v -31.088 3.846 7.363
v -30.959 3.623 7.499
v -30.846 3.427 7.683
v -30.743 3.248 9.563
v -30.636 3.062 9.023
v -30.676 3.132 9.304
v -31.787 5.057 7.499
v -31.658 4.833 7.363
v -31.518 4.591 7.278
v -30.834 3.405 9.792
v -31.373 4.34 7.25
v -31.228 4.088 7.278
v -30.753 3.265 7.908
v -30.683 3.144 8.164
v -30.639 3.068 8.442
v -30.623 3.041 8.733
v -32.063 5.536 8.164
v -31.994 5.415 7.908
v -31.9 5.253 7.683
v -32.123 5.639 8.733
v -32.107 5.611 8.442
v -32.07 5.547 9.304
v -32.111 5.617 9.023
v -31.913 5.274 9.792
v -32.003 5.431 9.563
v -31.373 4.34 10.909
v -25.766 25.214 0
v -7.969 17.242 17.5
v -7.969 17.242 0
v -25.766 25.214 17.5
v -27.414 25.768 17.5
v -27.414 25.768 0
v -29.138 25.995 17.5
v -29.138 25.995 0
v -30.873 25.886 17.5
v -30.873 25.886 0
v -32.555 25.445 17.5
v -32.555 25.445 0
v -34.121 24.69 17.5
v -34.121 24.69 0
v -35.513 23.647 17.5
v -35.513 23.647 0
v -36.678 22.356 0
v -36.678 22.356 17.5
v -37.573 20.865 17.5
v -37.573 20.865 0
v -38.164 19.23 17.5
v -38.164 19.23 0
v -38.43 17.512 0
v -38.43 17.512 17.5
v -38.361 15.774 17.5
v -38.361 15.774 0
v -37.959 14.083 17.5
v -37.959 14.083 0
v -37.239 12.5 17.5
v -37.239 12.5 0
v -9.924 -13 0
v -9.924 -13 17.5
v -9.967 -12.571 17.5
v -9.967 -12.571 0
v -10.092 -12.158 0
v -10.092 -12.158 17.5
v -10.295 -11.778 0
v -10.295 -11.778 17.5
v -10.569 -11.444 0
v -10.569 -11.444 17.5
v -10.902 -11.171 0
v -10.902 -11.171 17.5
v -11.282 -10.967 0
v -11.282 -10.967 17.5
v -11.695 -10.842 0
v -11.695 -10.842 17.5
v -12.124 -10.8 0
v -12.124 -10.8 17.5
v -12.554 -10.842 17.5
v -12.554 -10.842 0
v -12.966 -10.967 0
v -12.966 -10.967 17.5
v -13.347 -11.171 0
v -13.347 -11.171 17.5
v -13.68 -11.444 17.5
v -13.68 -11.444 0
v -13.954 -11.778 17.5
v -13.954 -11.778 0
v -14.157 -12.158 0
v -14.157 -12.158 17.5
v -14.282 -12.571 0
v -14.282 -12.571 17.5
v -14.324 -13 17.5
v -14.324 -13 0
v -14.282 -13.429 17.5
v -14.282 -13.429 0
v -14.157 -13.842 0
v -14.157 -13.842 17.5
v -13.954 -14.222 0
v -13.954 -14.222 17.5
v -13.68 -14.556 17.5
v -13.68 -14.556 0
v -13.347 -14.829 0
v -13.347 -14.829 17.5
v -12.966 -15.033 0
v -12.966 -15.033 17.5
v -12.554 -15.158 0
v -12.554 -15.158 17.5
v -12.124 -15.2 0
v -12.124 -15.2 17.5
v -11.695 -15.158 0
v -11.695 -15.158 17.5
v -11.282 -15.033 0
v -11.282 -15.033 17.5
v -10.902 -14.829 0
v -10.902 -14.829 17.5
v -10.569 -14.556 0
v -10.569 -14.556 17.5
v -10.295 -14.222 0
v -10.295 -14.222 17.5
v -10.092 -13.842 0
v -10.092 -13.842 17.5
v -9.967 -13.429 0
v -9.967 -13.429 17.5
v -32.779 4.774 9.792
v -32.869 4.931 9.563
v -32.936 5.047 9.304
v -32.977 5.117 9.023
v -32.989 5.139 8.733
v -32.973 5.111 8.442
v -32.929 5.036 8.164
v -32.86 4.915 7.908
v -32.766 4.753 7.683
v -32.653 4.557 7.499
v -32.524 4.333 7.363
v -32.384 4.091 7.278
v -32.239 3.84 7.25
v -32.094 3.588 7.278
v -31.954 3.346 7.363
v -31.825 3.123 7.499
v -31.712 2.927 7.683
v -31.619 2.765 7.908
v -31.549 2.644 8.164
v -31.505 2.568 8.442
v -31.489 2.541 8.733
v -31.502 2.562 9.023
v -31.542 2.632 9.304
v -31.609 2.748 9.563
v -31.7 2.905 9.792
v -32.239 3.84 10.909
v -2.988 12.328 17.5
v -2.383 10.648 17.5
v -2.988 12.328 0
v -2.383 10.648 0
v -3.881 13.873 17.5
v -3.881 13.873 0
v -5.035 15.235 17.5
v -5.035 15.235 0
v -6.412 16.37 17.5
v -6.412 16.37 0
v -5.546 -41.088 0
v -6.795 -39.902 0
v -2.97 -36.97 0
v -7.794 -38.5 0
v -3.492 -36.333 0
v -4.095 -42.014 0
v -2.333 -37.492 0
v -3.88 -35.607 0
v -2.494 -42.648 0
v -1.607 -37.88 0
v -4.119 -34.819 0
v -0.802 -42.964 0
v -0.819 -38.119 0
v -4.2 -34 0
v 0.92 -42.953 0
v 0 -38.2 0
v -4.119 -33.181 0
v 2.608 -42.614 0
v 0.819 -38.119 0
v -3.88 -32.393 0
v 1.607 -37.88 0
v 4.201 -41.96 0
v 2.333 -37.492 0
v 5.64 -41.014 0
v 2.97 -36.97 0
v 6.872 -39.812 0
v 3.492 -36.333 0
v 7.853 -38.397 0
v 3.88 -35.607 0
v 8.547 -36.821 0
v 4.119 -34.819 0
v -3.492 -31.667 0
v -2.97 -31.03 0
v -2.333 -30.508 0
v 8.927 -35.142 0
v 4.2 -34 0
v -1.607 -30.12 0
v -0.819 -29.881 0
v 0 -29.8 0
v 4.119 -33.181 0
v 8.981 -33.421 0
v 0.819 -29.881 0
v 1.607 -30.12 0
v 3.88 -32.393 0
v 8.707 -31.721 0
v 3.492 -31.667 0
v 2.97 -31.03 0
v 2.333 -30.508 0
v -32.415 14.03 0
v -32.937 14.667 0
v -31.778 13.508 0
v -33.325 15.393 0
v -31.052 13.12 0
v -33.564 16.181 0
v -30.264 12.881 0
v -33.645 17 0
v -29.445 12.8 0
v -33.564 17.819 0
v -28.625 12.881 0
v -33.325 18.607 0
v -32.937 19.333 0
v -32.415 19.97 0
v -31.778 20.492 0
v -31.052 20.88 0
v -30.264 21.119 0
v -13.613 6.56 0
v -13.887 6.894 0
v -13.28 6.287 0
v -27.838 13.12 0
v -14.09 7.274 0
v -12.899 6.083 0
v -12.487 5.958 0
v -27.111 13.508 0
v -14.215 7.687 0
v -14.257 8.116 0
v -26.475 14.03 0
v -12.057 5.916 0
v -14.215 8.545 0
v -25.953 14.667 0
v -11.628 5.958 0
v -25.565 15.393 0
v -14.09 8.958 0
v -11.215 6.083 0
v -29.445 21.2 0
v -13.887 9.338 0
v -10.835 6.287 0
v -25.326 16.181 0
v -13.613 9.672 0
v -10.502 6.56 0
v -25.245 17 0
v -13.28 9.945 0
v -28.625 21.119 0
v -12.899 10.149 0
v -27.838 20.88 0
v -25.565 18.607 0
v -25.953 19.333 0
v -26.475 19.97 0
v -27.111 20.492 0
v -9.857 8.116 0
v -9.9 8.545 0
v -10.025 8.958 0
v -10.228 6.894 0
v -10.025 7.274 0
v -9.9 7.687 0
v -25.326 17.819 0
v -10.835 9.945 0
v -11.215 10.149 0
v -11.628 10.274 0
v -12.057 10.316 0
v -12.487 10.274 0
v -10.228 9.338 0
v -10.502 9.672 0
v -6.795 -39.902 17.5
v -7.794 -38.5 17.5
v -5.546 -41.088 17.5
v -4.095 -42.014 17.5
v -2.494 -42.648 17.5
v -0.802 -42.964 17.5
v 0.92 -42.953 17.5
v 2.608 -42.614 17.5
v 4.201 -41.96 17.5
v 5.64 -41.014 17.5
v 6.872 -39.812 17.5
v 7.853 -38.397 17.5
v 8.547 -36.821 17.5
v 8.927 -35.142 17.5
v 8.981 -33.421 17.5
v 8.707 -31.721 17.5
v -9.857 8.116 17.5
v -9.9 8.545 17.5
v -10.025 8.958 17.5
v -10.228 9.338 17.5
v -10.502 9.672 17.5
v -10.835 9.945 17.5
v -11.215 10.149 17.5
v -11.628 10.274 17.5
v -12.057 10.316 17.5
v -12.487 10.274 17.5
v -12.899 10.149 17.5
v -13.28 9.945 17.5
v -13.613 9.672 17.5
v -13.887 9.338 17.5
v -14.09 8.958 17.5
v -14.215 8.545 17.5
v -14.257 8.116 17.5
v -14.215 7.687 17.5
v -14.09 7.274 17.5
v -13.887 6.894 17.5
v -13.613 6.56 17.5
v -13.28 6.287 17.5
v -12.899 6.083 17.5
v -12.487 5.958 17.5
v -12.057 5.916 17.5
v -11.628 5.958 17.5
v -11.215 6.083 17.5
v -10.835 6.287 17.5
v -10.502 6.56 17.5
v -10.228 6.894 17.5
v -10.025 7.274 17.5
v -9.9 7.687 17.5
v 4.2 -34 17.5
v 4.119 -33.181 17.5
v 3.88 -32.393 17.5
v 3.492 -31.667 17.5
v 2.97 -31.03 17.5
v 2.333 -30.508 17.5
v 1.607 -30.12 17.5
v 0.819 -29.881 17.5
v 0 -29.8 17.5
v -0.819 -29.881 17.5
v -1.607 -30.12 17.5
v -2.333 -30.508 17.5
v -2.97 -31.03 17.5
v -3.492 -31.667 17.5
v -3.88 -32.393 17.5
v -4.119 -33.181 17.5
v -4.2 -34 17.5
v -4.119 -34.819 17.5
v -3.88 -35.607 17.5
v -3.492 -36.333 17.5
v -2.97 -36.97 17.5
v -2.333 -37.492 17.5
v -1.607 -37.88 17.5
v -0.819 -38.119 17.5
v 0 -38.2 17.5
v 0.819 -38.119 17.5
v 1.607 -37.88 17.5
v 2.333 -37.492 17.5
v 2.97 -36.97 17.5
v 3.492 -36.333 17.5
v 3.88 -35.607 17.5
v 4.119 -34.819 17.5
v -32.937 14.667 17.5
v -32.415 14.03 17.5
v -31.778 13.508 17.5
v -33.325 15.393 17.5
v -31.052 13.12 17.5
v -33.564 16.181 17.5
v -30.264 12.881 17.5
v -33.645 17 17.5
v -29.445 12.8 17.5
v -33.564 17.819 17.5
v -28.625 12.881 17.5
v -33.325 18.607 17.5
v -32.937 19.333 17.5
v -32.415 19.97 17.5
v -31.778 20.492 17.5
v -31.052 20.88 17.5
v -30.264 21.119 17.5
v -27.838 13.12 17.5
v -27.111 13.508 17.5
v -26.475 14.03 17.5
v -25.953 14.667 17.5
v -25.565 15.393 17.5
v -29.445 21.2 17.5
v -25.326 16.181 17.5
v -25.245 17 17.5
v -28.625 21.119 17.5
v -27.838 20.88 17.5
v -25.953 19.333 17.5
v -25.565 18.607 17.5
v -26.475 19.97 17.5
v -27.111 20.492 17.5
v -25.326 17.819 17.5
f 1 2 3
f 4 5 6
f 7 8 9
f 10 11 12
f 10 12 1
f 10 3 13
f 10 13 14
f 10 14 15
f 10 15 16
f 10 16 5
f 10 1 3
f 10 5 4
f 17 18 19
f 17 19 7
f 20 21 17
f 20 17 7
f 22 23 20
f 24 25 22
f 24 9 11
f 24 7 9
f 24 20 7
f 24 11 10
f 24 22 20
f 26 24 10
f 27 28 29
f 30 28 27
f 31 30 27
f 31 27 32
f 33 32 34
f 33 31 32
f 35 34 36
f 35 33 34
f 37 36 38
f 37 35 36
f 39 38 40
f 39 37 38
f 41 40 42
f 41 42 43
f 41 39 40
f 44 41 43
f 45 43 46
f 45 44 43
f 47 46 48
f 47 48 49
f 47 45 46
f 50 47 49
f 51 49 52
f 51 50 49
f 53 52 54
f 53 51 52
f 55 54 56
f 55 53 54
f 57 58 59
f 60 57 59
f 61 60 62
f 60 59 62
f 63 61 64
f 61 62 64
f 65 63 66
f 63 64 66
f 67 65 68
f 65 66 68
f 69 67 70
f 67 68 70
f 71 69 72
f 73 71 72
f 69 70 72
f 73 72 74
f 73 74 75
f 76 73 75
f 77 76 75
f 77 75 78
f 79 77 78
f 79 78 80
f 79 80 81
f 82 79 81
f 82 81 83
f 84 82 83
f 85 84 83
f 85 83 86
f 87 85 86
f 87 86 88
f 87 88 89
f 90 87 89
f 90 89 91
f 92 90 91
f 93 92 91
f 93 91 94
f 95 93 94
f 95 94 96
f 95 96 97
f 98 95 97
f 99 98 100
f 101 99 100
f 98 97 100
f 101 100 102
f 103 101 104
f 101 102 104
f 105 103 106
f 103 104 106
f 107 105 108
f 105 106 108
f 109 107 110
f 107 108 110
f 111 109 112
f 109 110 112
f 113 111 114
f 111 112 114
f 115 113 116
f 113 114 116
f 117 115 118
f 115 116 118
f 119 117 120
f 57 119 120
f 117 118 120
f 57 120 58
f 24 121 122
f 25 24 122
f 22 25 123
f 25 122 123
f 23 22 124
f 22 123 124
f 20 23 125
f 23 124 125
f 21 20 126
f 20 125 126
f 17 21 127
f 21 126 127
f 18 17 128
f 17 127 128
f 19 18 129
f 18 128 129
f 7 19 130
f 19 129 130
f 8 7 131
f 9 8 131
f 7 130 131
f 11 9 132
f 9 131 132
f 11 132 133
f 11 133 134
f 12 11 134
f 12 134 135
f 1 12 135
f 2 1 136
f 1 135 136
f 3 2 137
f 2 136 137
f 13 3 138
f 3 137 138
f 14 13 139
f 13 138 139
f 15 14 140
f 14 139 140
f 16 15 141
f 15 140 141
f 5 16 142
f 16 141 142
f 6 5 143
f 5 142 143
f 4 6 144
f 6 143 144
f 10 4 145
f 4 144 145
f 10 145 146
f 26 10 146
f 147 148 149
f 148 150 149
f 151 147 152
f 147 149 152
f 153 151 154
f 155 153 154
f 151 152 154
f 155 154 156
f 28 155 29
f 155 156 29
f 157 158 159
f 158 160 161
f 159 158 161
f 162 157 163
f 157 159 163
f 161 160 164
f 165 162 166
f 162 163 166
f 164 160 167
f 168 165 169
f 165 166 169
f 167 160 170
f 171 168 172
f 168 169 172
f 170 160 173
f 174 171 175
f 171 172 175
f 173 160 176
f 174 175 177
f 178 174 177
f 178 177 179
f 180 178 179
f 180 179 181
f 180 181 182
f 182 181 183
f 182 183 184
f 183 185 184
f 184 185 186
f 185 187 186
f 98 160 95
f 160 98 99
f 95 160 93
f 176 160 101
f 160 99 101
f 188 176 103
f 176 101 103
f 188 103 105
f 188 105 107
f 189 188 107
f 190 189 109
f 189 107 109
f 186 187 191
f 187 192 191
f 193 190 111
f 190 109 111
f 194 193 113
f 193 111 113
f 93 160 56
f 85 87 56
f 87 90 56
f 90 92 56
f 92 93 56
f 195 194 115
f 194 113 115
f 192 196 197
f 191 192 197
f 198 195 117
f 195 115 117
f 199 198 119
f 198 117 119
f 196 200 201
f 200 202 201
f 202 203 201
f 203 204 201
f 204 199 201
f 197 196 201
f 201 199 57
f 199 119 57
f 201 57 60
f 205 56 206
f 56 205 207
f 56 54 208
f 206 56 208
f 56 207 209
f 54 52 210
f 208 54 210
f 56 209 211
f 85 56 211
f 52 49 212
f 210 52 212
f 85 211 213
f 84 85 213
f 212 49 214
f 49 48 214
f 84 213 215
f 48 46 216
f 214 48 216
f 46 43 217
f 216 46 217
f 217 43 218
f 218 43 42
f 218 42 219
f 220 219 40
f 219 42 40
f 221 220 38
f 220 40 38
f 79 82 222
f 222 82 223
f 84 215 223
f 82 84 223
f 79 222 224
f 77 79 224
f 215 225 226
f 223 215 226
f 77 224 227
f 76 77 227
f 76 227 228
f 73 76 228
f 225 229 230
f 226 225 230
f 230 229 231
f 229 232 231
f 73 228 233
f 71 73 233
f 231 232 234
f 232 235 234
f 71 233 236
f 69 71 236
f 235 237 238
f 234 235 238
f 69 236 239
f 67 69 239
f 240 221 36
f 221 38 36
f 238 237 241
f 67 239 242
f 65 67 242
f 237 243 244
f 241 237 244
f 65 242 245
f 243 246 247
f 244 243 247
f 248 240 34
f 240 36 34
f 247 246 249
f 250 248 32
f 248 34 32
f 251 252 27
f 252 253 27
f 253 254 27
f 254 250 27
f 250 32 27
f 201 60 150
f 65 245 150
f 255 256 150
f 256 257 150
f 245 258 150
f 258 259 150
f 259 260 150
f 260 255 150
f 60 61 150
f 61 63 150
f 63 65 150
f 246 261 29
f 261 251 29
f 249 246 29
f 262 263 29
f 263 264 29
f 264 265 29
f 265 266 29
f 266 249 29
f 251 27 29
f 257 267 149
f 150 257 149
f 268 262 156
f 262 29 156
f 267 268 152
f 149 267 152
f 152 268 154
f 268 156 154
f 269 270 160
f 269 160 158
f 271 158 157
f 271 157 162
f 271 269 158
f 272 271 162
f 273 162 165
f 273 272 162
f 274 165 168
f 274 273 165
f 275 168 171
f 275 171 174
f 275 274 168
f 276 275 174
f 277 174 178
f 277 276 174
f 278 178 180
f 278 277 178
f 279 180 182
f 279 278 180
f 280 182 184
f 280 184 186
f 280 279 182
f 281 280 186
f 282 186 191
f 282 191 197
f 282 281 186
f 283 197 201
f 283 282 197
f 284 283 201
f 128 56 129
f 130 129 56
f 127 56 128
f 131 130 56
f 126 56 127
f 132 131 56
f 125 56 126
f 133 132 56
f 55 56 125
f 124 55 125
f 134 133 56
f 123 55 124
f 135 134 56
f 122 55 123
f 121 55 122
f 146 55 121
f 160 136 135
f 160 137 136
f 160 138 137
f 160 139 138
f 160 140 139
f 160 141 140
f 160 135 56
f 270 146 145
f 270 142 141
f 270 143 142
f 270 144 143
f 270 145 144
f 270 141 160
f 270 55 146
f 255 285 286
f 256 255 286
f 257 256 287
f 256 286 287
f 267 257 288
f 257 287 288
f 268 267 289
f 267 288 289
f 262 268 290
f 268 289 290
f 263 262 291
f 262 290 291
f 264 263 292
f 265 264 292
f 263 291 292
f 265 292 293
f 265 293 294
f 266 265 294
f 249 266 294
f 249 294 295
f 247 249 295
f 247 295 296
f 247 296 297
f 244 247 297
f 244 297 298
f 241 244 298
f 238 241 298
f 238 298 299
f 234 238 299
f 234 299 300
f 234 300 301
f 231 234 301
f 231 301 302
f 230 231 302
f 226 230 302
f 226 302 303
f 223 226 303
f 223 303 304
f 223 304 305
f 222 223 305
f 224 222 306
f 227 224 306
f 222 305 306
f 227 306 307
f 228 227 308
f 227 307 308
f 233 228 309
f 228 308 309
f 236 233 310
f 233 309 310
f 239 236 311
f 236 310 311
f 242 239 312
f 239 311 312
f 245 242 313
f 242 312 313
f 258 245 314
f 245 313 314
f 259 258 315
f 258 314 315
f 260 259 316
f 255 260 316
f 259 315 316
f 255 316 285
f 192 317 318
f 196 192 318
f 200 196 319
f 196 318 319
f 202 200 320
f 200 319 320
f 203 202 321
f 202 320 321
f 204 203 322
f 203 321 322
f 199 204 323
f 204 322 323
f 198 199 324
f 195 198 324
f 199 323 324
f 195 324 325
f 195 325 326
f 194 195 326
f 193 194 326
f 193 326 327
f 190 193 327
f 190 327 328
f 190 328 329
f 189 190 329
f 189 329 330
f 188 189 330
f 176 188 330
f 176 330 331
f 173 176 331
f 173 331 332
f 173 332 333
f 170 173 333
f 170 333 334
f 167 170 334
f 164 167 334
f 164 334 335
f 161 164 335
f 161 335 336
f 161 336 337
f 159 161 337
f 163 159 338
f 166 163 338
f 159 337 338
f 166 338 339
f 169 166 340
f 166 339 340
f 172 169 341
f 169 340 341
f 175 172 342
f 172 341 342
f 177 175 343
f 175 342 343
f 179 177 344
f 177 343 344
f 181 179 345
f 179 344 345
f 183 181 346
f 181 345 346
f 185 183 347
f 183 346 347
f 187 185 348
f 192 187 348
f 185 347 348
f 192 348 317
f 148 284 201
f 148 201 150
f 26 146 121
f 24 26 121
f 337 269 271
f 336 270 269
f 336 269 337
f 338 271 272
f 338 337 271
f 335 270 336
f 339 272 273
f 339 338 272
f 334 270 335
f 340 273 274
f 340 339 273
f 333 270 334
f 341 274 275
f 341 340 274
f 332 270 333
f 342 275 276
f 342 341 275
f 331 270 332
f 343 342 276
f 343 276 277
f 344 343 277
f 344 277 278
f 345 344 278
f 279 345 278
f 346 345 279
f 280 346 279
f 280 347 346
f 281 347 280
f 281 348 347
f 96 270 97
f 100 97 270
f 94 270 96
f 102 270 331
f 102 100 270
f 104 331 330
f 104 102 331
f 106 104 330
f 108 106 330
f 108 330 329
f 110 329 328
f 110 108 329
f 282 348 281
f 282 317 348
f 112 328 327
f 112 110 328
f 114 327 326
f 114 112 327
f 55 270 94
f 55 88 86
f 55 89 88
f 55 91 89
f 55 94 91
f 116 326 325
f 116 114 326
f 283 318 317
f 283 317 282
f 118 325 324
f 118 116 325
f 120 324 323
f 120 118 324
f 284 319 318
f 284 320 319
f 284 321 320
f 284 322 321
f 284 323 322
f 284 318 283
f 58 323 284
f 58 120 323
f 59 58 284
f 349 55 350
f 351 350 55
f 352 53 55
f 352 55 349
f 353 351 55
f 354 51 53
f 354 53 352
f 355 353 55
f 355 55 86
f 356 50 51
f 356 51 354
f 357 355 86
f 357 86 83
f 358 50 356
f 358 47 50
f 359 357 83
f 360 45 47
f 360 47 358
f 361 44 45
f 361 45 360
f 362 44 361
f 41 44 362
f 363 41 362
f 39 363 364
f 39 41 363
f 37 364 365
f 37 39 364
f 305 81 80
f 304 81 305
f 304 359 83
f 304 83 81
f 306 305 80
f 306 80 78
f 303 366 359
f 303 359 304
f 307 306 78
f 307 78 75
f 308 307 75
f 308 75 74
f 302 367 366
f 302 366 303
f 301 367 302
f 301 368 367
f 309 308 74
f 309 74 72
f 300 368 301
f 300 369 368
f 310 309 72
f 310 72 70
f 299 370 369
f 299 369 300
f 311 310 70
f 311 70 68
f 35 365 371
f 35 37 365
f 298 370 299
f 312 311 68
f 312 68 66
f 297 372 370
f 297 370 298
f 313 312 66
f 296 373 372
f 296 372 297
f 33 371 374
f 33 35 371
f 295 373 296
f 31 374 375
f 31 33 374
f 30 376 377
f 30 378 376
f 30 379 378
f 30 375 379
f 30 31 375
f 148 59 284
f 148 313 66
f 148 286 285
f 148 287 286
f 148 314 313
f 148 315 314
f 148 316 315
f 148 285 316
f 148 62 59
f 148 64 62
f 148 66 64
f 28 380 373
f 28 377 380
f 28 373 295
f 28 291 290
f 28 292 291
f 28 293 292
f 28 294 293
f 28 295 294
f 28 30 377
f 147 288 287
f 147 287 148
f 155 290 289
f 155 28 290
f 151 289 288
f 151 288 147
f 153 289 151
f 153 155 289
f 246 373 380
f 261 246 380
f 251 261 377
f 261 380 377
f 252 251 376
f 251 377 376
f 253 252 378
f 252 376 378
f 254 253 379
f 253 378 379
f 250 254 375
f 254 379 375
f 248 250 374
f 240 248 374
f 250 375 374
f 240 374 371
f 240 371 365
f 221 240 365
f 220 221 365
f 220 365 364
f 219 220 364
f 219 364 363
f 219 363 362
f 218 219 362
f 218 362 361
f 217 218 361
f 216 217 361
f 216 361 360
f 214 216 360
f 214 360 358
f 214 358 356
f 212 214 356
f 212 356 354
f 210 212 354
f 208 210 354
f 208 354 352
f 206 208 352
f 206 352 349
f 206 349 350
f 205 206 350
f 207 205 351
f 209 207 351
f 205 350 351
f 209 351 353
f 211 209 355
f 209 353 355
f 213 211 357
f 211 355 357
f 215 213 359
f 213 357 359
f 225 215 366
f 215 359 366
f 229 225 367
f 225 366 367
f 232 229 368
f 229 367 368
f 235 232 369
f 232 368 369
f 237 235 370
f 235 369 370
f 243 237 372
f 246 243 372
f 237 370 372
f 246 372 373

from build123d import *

# Parameters (mm, degrees)
BOSS_EXTRUDE1_DEPTH = 17.5
CUT_EXTRUDE1_DEPTH  = 1
HOLE1_D             = 4.4
HOLE2_D             = 4.4
HOLE3_D             = 8.4
HOLE4_D             = 8.4
FILLET1_R           = 10


with BuildPart() as part:
    # Sketch1 → Boss-Extrude1 (new body)
    with BuildSketch(Plane.XY.offset(17.5)):
        with BuildLine():
            Line((8.706689755, -31.721063073), (-3.596567561, 15.283592096))
            Line((-3.596567561, 15.283592096), (-25.765781543, 25.213668746))
            ThreePointArc((-25.765781543, 25.213668746), (-36.126401787, 23.029680686), (-37.239092363, 12.5))
            Line((-37.239092363, 12.5), (-7.794228634, -38.5))
            ThreePointArc((-7.794228634, -38.5), (3.420035495, -42.324863795), (8.706689755, -31.721063073))
        make_face()
    extrude(amount=-BOSS_EXTRUDE1_DEPTH)

    # Sketch2 → Cut-Extrude1 (cut)
    with BuildSketch(Plane(origin=(-22.516660498, -13, 0), x_dir=(0, 0, 1), z_dir=(-0.866025403784438, -0.500000000000001, 0))):
        with BuildLine():
            Line((9.791987556, 18.365854028), (10.909334809, 19.444863729))
            Line((10.909334809, 19.444863729), (9.791987556, 20.523873429))
            ThreePointArc((9.791987556, 20.523873429), (7.25, 19.444863729), (9.791987556, 18.365854028))
        make_face()
    extrude(amount=-CUT_EXTRUDE1_DEPTH, mode=Mode.SUBTRACT)

    # Hole1 (through all)
    with Locations(Plane(origin=(0, 0, 0), x_dir=(-1, 0, 0), z_dir=(0, 0, -1))):
        with Locations((12.057368355, 8.116025404)):
            Hole(HOLE1_D / 2)

    # Hole2 (through all)
    with Locations(Plane(origin=(0, 0, 0), x_dir=(-1, 0, 0), z_dir=(0, 0, -1))):
        with Locations((12.124355653, -13)):
            Hole(HOLE2_D / 2)

    # Hole3 (through all)
    with Locations(Plane(origin=(0, 0, 0), x_dir=(-1, 0, 0), z_dir=(0, 0, -1))):
        with Locations((0, -34)):
            Hole(HOLE3_D / 2)

    # Hole4 (through all)
    with Locations(Plane(origin=(0, 0, 0), x_dir=(-1, 0, 0), z_dir=(0, 0, -1))):
        with Locations((29.444863729, 17)):
            Hole(HOLE4_D / 2)

    # Fillet1
    fillet1_edges = [part.edges().sort_by_distance(p)[0] for p in [
        (-3.596567561, 15.283592096, 8.75),
    ]]
    fillet(fillet1_edges, radius=FILLET1_R)


solid = part.part
